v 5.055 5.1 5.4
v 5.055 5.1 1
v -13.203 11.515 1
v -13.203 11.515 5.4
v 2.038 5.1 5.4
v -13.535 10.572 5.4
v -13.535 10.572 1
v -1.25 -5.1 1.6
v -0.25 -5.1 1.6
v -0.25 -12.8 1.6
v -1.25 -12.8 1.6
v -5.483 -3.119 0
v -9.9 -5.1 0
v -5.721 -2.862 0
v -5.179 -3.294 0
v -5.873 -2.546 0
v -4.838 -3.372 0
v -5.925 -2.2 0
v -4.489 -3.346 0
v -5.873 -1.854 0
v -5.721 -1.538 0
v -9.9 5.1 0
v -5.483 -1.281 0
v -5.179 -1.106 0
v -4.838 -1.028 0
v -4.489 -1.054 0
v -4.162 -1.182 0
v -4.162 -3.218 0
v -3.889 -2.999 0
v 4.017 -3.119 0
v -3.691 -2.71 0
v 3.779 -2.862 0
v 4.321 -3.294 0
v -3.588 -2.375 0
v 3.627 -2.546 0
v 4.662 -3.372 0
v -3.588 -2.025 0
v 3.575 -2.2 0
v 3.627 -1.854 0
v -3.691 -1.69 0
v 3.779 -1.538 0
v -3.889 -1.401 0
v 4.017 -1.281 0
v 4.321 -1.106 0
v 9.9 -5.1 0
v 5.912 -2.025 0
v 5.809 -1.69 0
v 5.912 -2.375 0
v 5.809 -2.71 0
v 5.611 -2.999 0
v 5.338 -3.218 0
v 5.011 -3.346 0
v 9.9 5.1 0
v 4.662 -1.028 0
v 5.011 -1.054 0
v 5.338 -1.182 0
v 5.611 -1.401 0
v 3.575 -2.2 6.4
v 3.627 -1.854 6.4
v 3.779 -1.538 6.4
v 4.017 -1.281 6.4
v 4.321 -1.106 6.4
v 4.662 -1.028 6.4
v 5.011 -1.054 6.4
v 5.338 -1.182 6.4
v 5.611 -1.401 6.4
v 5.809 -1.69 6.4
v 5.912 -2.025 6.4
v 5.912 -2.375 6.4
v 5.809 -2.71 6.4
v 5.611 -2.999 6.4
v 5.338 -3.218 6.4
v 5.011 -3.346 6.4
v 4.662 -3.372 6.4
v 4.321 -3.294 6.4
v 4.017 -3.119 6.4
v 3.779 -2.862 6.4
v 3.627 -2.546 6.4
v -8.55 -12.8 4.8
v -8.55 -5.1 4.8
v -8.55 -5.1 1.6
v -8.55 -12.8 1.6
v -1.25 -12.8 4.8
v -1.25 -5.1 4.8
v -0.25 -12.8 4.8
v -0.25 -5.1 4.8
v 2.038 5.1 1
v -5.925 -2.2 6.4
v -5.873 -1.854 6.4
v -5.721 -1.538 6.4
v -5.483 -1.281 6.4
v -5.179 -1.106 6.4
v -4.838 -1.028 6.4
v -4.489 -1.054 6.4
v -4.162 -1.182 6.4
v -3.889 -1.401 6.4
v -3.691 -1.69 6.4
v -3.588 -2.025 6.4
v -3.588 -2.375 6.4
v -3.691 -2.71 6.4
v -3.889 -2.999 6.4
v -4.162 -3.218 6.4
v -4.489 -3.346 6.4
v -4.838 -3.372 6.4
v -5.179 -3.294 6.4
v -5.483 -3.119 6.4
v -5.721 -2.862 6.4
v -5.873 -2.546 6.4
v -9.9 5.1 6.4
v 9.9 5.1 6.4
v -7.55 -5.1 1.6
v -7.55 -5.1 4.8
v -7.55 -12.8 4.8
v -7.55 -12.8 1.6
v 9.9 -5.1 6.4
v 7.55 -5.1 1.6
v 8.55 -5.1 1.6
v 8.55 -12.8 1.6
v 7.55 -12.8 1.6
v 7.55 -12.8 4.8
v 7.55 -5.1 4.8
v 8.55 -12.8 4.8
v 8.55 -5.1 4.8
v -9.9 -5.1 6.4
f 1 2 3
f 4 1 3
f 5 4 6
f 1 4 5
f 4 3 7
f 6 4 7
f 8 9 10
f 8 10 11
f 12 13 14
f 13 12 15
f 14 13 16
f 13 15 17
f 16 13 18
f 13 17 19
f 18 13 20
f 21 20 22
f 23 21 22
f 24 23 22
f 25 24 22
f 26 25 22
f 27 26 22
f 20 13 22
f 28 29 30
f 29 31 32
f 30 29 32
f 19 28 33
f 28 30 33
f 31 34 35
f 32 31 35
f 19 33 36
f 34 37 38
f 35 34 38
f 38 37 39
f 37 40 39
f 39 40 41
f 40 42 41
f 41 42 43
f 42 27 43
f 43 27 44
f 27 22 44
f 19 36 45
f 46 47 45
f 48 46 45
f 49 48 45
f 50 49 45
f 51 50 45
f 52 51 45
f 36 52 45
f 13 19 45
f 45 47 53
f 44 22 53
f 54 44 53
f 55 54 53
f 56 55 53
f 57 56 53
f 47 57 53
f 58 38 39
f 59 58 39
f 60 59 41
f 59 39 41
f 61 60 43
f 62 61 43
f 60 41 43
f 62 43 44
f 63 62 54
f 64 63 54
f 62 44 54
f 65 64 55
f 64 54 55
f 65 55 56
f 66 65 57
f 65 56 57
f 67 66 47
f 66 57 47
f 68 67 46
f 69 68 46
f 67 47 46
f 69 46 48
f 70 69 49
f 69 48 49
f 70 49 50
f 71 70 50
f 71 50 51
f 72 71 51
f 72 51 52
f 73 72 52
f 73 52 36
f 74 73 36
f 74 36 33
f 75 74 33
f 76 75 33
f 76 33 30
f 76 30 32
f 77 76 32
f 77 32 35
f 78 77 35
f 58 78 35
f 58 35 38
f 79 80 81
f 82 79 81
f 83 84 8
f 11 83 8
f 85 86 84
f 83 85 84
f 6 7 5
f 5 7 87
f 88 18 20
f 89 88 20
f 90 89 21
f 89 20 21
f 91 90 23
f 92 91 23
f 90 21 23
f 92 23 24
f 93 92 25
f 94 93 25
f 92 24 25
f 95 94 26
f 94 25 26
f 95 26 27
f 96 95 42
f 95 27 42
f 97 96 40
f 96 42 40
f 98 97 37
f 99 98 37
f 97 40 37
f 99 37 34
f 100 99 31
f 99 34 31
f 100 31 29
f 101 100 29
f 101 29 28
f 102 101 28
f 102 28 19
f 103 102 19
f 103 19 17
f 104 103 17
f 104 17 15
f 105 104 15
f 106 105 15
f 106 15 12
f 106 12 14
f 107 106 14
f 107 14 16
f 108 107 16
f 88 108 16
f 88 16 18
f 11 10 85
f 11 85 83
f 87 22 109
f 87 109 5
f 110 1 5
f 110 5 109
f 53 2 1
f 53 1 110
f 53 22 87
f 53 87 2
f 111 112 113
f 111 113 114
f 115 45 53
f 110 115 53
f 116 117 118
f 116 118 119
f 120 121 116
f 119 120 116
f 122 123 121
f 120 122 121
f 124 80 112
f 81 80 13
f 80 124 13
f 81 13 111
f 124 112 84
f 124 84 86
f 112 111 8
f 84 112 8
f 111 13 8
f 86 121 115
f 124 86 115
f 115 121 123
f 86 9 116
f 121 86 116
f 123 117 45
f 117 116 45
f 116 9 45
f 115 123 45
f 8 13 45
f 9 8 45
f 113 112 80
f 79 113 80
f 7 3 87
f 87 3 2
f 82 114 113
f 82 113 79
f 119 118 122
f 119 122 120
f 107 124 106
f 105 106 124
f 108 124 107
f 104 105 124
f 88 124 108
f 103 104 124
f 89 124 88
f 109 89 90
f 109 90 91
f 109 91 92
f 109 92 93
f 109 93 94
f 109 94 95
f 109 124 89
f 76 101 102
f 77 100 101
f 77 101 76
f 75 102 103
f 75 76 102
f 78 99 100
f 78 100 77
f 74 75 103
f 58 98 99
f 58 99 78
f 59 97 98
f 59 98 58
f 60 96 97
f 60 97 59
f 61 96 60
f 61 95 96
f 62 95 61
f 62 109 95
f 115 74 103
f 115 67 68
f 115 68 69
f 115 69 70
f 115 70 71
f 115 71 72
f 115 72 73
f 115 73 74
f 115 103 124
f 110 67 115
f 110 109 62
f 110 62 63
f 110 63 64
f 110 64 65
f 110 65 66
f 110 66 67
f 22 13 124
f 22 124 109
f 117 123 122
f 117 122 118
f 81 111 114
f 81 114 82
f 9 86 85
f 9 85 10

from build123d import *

# Parameters (mm, degrees)
SKETCH_1_W          = 19.8
SKETCH_1_H          = 10.2
EXTRUDE_1_DEPTH     = 6.4
SKETCH_2_R          = 1.175
CUT_EXTRUDE_1_DEPTH = 7.4
SKETCH_3_W          = 1
SKETCH_3_H          = 3.2
EXTRUDE_1_2_DEPTH   = 7.7
EXTRUDE_START       = -1
EXTRUDE_2_DEPTH     = 4.4


with BuildPart() as part:
    # 草图1 → Extrude 1 (new body)
    with BuildSketch(Plane.XY):
        Rectangle(SKETCH_1_W, SKETCH_1_H)
    extrude(amount=EXTRUDE_1_DEPTH)

    # 草图2 → 切除-拉伸1 (cut, through all)
    with BuildSketch(Plane(origin=(0, 0, 0), x_dir=(-1, 0, 0), z_dir=(0, 0, -1))):
        with Locations((-4.75, -2.2)):
            Circle(SKETCH_2_R)
        with Locations((4.75, -2.2)):
            Circle(SKETCH_2_R)
    extrude(amount=-CUT_EXTRUDE_1_DEPTH, mode=Mode.SUBTRACT)

    # 草图3 → Extrude 1 2 (add)
    with BuildSketch(Plane(origin=(0, -5.1, 0), x_dir=(-1, 0, 0), z_dir=(0, -1, 0))):
        with Locations((-8.05, -3.2)):
            Rectangle(SKETCH_3_W, SKETCH_3_H)
        with Locations((0.75, -3.2)):
            Rectangle(SKETCH_3_W, SKETCH_3_H)
        with Locations((8.05, -3.2)):
            Rectangle(SKETCH_3_W, SKETCH_3_H)
    extrude(amount=EXTRUDE_1_2_DEPTH)

    # 草图4 → 拉伸-薄壁2 (add)
    with BuildSketch(Plane(origin=(0, 0, 0), x_dir=(-1, 0, 0), z_dir=(0, 0, -1)).offset(EXTRUDE_START)):
        Polygon((-5.054923372, 5.1), (13.203386491, 11.514977847), (13.534867703, 10.571516026), (-4.723442161, 4.15653818), align=None)
    extrude(amount=-EXTRUDE_2_DEPTH)


solid = part.part
